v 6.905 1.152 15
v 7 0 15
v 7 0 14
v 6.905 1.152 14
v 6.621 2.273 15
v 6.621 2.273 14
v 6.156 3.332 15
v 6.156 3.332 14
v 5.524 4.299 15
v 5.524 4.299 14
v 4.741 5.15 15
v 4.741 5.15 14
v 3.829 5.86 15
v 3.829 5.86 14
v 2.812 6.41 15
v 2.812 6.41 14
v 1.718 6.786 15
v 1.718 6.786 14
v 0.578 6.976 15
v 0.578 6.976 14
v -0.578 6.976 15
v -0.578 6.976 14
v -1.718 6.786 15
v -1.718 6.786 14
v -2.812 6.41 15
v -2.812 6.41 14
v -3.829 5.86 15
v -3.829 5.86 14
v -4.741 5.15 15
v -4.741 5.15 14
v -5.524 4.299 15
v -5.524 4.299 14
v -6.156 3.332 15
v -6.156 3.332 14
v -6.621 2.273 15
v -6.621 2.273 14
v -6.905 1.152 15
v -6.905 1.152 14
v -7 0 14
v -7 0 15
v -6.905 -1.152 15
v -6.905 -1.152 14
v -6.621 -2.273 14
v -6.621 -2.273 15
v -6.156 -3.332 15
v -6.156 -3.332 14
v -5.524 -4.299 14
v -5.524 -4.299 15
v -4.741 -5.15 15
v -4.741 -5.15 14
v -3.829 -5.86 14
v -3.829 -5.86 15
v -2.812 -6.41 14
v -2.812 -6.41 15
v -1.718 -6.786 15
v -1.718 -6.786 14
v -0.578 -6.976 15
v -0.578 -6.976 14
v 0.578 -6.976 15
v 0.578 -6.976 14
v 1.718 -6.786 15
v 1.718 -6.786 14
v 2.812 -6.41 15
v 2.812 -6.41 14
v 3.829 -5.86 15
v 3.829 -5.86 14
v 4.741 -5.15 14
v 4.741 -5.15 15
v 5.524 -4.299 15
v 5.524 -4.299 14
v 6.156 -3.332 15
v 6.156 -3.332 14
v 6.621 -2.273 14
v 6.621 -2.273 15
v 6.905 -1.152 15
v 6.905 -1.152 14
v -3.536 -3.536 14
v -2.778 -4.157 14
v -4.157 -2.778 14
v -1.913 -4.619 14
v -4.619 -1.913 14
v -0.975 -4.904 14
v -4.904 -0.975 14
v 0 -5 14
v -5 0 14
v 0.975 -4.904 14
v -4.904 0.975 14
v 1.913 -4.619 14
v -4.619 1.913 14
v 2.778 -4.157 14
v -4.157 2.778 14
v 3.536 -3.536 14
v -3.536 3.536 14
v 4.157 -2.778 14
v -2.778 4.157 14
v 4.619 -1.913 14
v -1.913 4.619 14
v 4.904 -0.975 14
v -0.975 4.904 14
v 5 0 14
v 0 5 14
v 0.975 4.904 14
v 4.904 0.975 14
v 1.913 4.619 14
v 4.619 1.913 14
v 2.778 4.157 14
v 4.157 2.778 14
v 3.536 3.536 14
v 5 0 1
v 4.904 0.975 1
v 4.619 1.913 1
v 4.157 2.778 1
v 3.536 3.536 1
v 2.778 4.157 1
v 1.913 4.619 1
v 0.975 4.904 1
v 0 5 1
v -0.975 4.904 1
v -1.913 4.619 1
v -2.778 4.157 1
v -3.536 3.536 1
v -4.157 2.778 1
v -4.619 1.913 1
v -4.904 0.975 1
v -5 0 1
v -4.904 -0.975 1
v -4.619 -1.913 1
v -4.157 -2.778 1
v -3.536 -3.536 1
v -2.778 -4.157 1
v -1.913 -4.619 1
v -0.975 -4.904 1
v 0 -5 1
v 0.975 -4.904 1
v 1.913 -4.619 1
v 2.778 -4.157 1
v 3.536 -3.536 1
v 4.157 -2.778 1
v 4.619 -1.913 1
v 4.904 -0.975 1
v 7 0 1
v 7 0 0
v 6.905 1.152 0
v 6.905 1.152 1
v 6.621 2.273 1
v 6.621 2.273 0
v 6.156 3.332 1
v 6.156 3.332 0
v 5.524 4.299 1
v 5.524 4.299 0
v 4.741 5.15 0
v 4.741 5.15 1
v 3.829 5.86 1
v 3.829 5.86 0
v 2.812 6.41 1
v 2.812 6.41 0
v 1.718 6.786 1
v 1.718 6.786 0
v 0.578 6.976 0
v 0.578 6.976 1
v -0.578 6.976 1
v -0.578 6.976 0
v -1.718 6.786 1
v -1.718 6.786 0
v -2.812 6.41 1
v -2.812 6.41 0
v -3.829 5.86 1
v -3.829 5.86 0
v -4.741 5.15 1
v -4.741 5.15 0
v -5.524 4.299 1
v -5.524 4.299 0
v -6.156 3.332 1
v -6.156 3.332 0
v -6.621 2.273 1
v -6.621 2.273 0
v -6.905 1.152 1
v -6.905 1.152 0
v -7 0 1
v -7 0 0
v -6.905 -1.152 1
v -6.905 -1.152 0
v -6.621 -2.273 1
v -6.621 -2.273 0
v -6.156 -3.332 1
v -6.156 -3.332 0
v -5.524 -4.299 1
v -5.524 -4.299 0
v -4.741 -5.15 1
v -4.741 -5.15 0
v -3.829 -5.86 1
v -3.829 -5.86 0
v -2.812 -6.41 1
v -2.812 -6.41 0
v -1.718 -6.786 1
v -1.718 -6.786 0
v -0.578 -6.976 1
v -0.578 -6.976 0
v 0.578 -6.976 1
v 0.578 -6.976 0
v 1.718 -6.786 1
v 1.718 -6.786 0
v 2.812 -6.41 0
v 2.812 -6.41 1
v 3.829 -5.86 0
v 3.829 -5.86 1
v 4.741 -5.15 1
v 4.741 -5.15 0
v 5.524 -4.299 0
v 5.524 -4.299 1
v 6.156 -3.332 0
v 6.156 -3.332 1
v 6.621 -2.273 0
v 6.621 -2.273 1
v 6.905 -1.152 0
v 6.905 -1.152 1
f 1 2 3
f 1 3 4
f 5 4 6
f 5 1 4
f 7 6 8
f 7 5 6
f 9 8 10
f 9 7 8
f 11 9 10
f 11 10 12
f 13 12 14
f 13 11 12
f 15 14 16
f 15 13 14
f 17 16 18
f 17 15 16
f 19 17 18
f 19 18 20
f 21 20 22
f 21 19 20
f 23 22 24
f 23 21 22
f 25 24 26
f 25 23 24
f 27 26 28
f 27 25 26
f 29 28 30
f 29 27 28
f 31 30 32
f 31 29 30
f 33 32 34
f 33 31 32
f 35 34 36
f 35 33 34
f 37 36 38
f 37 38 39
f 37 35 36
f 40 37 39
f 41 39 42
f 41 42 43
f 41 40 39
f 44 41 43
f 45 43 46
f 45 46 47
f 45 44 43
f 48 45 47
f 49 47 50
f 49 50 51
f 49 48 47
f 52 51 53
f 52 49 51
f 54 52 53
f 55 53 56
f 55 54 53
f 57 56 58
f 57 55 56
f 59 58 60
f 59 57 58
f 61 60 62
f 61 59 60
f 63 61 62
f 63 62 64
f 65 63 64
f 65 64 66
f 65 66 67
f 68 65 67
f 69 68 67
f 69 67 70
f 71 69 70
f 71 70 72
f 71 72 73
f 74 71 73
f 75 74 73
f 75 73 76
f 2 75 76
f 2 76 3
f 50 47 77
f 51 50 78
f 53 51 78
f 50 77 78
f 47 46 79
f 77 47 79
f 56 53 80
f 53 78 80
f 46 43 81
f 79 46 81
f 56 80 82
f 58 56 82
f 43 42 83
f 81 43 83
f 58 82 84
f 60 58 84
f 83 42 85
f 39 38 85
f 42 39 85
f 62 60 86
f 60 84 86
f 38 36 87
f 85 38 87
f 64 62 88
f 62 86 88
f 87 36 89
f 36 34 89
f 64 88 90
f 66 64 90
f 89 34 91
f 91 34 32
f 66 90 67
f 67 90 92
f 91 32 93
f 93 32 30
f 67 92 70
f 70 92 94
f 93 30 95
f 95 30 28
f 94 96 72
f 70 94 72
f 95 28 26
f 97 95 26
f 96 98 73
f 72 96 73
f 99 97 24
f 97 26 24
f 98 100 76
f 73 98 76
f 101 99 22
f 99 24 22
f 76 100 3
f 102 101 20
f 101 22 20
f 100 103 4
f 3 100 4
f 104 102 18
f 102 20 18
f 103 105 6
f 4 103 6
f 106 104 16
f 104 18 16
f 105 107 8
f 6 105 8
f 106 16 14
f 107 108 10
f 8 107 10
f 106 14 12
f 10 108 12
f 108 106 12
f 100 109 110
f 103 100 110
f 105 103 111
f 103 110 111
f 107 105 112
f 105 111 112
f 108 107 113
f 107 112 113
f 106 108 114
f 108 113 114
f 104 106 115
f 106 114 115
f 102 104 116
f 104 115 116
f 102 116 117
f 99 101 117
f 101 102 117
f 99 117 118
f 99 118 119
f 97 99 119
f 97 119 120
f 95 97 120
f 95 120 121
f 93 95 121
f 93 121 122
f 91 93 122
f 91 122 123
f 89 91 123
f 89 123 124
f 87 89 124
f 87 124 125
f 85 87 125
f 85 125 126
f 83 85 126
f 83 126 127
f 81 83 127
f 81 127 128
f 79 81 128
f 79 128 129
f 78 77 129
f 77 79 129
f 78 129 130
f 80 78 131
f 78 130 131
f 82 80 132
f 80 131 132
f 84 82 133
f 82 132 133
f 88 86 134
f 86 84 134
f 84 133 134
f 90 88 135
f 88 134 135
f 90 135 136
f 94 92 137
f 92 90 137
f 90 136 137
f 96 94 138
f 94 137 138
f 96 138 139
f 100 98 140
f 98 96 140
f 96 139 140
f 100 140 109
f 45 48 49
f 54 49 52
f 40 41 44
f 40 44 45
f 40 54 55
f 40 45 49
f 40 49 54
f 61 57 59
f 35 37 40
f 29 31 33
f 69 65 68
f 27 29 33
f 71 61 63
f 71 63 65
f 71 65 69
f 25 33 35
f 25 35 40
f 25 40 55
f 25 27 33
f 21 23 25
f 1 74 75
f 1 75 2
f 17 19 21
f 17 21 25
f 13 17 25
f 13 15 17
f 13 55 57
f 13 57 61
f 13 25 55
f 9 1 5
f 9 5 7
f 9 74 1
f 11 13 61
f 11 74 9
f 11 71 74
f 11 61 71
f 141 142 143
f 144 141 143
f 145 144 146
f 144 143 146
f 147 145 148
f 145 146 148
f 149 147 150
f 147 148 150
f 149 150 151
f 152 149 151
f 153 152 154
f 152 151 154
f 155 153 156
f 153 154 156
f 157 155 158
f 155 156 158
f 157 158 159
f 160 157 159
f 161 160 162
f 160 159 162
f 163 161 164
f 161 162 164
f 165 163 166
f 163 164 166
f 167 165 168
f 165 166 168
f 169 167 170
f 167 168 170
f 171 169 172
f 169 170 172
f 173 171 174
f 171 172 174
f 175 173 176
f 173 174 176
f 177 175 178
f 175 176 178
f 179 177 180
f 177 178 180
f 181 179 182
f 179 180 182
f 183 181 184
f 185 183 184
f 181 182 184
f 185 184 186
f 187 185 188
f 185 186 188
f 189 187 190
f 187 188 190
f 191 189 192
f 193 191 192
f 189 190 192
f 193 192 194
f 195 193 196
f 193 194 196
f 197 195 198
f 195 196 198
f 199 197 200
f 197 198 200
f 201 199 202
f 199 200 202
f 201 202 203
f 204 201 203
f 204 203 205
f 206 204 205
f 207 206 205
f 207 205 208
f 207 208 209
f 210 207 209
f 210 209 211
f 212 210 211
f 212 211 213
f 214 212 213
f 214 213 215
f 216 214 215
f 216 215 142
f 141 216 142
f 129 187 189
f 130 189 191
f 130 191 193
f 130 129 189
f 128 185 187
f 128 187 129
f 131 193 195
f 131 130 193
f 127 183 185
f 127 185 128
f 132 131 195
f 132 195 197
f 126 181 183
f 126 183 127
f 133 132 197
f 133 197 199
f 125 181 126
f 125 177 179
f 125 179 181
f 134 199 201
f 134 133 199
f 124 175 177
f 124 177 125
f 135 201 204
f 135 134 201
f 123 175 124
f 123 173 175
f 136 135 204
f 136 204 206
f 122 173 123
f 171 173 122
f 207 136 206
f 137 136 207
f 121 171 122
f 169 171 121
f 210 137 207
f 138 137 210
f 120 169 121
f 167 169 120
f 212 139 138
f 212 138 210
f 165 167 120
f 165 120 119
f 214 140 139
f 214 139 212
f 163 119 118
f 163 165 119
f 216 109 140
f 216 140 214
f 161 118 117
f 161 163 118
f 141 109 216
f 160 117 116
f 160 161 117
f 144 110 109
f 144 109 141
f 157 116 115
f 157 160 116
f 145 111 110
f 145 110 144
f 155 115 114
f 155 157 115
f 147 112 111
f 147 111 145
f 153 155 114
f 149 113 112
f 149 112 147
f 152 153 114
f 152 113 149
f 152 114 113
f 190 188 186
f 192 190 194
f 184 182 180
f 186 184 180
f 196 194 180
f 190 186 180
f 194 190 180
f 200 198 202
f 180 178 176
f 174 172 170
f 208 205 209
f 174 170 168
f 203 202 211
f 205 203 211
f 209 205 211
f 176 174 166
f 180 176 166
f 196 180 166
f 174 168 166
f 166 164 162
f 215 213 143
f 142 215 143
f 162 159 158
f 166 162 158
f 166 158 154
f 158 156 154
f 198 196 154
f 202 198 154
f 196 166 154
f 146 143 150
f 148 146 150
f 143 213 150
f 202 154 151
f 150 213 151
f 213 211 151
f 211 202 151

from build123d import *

# Parameters (mm, degrees)
F0_R     = 5
F1_DEPTH = 15
F2_R     = 7
F2_R_2   = 2.75
F3_DEPTH = 1
F4_R     = 7
F5_DEPTH = 1


with BuildPart() as f1:
    # F0 (on Top) → F1 (new body)
    with BuildSketch(Plane.XY):
        Circle(F0_R)
    extrude(amount=F1_DEPTH)

    # F2 (on Top) → F3 (join)
    with BuildSketch(Plane.XY):
        Circle(F2_R)
        Circle(F2_R_2, mode=Mode.SUBTRACT)
    extrude(amount=F3_DEPTH)

    # F4 (on face) → F5 (join)
    with BuildSketch(Plane.XY.offset(15)):
        Circle(F4_R)
    extrude(amount=-F5_DEPTH)


solid = f1.part
